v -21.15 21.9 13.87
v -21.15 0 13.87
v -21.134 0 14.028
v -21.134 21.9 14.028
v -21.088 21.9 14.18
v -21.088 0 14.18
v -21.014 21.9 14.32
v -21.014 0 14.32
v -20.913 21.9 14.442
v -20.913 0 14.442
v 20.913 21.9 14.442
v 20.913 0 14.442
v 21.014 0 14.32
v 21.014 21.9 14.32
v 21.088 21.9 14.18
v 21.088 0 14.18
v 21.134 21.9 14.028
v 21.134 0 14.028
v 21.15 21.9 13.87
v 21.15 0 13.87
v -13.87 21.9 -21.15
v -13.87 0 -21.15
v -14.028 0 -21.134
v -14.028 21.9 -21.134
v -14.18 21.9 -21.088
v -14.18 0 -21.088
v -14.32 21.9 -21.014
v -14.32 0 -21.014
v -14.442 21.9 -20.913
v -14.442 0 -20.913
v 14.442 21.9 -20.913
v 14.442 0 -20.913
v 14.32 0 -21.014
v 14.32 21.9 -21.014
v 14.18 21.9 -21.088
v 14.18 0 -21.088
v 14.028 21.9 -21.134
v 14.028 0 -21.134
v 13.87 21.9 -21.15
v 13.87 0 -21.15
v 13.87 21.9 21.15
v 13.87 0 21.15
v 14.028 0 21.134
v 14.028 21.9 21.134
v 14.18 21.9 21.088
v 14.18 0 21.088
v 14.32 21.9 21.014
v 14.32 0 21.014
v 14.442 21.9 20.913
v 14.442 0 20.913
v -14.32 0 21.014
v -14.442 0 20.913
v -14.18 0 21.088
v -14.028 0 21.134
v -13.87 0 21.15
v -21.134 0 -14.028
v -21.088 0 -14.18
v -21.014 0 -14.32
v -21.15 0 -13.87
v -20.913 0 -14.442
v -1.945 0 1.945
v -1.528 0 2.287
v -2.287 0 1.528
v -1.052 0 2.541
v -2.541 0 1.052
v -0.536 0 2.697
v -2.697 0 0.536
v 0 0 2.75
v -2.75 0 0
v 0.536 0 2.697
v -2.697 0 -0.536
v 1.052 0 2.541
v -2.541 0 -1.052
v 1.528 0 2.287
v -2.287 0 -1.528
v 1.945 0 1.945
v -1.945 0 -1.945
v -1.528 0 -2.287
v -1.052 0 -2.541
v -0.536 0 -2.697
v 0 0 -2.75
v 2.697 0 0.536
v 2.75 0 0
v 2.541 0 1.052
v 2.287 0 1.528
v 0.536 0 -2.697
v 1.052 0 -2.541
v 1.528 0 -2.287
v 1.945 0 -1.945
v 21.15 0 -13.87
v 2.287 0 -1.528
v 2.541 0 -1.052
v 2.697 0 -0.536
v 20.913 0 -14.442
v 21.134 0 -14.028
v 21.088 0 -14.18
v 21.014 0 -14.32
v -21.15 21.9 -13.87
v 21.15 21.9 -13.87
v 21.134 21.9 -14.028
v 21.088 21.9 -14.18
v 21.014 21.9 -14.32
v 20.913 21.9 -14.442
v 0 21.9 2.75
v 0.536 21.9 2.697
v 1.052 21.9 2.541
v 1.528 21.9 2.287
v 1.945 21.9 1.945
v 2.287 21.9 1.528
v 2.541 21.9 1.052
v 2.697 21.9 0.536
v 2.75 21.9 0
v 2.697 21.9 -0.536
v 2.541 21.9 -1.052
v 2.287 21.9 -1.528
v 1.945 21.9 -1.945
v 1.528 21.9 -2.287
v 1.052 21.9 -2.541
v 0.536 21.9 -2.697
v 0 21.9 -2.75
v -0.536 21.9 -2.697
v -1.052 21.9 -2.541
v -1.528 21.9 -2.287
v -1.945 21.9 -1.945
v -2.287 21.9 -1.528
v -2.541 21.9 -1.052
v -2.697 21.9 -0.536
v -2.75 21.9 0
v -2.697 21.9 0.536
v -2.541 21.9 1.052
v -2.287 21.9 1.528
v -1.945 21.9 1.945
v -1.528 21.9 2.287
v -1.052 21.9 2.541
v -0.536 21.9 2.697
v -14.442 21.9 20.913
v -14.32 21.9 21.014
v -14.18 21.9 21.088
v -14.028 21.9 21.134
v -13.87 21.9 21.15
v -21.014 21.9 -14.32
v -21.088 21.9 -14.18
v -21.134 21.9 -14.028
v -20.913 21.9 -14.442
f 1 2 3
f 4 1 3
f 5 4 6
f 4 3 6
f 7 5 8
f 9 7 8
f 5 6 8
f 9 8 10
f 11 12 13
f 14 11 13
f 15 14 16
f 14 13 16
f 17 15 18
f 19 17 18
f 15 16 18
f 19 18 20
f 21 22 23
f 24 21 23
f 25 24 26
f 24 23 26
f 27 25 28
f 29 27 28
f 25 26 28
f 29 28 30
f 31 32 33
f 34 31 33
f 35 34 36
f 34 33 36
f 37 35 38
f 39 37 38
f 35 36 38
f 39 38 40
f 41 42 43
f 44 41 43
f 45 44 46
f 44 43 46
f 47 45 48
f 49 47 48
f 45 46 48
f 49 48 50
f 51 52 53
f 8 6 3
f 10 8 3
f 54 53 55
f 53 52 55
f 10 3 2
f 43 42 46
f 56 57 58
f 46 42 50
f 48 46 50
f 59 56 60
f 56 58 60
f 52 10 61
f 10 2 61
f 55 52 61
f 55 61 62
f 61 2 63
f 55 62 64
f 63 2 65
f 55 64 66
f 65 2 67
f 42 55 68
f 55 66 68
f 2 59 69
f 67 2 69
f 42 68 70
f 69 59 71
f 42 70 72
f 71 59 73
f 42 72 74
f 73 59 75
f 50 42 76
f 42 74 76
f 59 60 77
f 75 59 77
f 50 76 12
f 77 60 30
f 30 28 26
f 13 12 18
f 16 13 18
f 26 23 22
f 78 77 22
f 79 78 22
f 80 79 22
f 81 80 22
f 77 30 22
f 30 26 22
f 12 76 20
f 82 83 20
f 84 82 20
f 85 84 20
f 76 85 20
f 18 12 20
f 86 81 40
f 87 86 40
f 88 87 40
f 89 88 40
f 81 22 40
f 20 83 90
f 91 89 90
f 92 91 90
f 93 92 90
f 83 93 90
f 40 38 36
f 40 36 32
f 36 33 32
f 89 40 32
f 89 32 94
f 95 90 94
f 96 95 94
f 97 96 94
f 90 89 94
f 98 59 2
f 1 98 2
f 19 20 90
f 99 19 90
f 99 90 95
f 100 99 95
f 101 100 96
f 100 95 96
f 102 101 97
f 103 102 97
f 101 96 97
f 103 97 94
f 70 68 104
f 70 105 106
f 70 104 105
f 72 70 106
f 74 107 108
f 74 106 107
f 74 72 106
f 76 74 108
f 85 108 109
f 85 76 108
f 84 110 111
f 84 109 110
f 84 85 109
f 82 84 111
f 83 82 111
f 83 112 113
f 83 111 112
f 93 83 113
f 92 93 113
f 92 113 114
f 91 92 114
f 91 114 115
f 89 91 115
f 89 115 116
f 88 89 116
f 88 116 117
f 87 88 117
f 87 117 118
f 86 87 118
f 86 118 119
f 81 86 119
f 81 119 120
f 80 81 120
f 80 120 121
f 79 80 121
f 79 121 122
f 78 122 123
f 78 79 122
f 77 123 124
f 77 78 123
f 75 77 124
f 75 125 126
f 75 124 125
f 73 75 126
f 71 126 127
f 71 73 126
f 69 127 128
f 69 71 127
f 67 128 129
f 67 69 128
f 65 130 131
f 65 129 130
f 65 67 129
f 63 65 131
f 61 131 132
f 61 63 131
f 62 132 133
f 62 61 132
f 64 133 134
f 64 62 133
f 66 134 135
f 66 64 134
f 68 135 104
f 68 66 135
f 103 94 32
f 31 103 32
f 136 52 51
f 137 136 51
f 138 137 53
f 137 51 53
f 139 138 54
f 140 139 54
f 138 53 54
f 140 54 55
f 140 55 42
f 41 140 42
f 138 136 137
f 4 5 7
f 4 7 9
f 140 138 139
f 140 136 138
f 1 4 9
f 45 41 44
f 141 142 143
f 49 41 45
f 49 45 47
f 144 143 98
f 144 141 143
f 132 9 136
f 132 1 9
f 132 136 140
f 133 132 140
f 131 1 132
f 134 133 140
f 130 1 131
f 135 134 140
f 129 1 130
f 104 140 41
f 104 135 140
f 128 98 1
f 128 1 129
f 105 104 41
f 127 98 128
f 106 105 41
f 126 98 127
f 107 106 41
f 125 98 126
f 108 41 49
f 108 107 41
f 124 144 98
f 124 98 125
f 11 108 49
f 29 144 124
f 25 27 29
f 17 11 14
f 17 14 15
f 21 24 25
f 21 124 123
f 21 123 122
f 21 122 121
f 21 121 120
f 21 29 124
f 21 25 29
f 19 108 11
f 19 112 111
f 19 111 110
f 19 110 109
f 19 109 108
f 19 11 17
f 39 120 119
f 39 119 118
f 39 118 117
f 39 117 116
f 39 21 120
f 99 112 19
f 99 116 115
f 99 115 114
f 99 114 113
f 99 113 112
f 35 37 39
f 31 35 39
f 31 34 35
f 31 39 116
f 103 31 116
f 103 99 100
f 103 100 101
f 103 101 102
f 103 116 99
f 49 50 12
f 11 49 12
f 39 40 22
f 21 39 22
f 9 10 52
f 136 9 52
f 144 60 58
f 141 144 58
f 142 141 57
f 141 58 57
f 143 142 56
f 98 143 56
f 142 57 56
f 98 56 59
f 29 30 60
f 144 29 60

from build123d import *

# Parameters (mm, degrees)
BOSS_EXTRUDE1_DEPTH     = 21.9
CUT_EXTRUDE1_DEPTH      = 38.070945496
CUT_EXTRUDE1_DEPTH_BACK = 38.070945496
SKETCH2_R               = 2.75


with BuildPart() as part:
    # Sketch1 → Boss-Extrude1 (new body)
    with BuildSketch(Plane(origin=(0, 0, 0), x_dir=(1, 0, 0), z_dir=(0, 1, 0))):
        with BuildLine():
            Line((-14.442201826, 20.913137233), (-20.913137233, 14.442201826))
            ThreePointArc((-20.913137233, 14.442201826), (-21.088441372, 14.179840641), (-21.15, 13.870364522))
            Line((-21.15, 13.870364522), (-21.15, -13.870364522))
            ThreePointArc((-21.15, -13.870364522), (-21.088441372, -14.179840641), (-20.913137233, -14.442201826))
            Line((-20.913137233, -14.442201826), (-14.442201826, -20.913137233))
            ThreePointArc((-14.442201826, -20.913137233), (-14.179840641, -21.088441372), (-13.870364522, -21.15))
            Line((-13.870364522, -21.15), (13.870364522, -21.15))
            ThreePointArc((13.870364522, -21.15), (14.179840641, -21.088441372), (14.442201826, -20.913137233))
            Line((14.442201826, -20.913137233), (20.913137233, -14.442201826))
            ThreePointArc((20.913137233, -14.442201826), (21.088441372, -14.179840641), (21.15, -13.870364522))
            Line((21.15, -13.870364522), (21.15, 13.870364522))
            ThreePointArc((21.15, 13.870364522), (21.088441372, 14.179840641), (20.913137233, 14.442201826))
            Line((20.913137233, 14.442201826), (14.442201826, 20.913137233))
            ThreePointArc((14.442201826, 20.913137233), (14.179840641, 21.088441372), (13.870364522, 21.15))
            Line((13.870364522, 21.15), (-13.870364522, 21.15))
            ThreePointArc((-13.870364522, 21.15), (-14.179840641, 21.088441372), (-14.442201826, 20.913137233))
        make_face()
    extrude(amount=BOSS_EXTRUDE1_DEPTH)

    # Sketch2 → Cut-Extrude1 (cut, two sides: drawn at the far end of the back side and taken through both)
    with BuildSketch(Plane(origin=(0, 21.9, 0), x_dir=(1, 0, 0), z_dir=(0, 1, 0)).offset(-CUT_EXTRUDE1_DEPTH_BACK)):
        with Locations(Location((0, 0, 0), (0, 0, 270))):
            Circle(SKETCH2_R)
    extrude(amount=CUT_EXTRUDE1_DEPTH + CUT_EXTRUDE1_DEPTH_BACK, mode=Mode.SUBTRACT)


solid = part.part
